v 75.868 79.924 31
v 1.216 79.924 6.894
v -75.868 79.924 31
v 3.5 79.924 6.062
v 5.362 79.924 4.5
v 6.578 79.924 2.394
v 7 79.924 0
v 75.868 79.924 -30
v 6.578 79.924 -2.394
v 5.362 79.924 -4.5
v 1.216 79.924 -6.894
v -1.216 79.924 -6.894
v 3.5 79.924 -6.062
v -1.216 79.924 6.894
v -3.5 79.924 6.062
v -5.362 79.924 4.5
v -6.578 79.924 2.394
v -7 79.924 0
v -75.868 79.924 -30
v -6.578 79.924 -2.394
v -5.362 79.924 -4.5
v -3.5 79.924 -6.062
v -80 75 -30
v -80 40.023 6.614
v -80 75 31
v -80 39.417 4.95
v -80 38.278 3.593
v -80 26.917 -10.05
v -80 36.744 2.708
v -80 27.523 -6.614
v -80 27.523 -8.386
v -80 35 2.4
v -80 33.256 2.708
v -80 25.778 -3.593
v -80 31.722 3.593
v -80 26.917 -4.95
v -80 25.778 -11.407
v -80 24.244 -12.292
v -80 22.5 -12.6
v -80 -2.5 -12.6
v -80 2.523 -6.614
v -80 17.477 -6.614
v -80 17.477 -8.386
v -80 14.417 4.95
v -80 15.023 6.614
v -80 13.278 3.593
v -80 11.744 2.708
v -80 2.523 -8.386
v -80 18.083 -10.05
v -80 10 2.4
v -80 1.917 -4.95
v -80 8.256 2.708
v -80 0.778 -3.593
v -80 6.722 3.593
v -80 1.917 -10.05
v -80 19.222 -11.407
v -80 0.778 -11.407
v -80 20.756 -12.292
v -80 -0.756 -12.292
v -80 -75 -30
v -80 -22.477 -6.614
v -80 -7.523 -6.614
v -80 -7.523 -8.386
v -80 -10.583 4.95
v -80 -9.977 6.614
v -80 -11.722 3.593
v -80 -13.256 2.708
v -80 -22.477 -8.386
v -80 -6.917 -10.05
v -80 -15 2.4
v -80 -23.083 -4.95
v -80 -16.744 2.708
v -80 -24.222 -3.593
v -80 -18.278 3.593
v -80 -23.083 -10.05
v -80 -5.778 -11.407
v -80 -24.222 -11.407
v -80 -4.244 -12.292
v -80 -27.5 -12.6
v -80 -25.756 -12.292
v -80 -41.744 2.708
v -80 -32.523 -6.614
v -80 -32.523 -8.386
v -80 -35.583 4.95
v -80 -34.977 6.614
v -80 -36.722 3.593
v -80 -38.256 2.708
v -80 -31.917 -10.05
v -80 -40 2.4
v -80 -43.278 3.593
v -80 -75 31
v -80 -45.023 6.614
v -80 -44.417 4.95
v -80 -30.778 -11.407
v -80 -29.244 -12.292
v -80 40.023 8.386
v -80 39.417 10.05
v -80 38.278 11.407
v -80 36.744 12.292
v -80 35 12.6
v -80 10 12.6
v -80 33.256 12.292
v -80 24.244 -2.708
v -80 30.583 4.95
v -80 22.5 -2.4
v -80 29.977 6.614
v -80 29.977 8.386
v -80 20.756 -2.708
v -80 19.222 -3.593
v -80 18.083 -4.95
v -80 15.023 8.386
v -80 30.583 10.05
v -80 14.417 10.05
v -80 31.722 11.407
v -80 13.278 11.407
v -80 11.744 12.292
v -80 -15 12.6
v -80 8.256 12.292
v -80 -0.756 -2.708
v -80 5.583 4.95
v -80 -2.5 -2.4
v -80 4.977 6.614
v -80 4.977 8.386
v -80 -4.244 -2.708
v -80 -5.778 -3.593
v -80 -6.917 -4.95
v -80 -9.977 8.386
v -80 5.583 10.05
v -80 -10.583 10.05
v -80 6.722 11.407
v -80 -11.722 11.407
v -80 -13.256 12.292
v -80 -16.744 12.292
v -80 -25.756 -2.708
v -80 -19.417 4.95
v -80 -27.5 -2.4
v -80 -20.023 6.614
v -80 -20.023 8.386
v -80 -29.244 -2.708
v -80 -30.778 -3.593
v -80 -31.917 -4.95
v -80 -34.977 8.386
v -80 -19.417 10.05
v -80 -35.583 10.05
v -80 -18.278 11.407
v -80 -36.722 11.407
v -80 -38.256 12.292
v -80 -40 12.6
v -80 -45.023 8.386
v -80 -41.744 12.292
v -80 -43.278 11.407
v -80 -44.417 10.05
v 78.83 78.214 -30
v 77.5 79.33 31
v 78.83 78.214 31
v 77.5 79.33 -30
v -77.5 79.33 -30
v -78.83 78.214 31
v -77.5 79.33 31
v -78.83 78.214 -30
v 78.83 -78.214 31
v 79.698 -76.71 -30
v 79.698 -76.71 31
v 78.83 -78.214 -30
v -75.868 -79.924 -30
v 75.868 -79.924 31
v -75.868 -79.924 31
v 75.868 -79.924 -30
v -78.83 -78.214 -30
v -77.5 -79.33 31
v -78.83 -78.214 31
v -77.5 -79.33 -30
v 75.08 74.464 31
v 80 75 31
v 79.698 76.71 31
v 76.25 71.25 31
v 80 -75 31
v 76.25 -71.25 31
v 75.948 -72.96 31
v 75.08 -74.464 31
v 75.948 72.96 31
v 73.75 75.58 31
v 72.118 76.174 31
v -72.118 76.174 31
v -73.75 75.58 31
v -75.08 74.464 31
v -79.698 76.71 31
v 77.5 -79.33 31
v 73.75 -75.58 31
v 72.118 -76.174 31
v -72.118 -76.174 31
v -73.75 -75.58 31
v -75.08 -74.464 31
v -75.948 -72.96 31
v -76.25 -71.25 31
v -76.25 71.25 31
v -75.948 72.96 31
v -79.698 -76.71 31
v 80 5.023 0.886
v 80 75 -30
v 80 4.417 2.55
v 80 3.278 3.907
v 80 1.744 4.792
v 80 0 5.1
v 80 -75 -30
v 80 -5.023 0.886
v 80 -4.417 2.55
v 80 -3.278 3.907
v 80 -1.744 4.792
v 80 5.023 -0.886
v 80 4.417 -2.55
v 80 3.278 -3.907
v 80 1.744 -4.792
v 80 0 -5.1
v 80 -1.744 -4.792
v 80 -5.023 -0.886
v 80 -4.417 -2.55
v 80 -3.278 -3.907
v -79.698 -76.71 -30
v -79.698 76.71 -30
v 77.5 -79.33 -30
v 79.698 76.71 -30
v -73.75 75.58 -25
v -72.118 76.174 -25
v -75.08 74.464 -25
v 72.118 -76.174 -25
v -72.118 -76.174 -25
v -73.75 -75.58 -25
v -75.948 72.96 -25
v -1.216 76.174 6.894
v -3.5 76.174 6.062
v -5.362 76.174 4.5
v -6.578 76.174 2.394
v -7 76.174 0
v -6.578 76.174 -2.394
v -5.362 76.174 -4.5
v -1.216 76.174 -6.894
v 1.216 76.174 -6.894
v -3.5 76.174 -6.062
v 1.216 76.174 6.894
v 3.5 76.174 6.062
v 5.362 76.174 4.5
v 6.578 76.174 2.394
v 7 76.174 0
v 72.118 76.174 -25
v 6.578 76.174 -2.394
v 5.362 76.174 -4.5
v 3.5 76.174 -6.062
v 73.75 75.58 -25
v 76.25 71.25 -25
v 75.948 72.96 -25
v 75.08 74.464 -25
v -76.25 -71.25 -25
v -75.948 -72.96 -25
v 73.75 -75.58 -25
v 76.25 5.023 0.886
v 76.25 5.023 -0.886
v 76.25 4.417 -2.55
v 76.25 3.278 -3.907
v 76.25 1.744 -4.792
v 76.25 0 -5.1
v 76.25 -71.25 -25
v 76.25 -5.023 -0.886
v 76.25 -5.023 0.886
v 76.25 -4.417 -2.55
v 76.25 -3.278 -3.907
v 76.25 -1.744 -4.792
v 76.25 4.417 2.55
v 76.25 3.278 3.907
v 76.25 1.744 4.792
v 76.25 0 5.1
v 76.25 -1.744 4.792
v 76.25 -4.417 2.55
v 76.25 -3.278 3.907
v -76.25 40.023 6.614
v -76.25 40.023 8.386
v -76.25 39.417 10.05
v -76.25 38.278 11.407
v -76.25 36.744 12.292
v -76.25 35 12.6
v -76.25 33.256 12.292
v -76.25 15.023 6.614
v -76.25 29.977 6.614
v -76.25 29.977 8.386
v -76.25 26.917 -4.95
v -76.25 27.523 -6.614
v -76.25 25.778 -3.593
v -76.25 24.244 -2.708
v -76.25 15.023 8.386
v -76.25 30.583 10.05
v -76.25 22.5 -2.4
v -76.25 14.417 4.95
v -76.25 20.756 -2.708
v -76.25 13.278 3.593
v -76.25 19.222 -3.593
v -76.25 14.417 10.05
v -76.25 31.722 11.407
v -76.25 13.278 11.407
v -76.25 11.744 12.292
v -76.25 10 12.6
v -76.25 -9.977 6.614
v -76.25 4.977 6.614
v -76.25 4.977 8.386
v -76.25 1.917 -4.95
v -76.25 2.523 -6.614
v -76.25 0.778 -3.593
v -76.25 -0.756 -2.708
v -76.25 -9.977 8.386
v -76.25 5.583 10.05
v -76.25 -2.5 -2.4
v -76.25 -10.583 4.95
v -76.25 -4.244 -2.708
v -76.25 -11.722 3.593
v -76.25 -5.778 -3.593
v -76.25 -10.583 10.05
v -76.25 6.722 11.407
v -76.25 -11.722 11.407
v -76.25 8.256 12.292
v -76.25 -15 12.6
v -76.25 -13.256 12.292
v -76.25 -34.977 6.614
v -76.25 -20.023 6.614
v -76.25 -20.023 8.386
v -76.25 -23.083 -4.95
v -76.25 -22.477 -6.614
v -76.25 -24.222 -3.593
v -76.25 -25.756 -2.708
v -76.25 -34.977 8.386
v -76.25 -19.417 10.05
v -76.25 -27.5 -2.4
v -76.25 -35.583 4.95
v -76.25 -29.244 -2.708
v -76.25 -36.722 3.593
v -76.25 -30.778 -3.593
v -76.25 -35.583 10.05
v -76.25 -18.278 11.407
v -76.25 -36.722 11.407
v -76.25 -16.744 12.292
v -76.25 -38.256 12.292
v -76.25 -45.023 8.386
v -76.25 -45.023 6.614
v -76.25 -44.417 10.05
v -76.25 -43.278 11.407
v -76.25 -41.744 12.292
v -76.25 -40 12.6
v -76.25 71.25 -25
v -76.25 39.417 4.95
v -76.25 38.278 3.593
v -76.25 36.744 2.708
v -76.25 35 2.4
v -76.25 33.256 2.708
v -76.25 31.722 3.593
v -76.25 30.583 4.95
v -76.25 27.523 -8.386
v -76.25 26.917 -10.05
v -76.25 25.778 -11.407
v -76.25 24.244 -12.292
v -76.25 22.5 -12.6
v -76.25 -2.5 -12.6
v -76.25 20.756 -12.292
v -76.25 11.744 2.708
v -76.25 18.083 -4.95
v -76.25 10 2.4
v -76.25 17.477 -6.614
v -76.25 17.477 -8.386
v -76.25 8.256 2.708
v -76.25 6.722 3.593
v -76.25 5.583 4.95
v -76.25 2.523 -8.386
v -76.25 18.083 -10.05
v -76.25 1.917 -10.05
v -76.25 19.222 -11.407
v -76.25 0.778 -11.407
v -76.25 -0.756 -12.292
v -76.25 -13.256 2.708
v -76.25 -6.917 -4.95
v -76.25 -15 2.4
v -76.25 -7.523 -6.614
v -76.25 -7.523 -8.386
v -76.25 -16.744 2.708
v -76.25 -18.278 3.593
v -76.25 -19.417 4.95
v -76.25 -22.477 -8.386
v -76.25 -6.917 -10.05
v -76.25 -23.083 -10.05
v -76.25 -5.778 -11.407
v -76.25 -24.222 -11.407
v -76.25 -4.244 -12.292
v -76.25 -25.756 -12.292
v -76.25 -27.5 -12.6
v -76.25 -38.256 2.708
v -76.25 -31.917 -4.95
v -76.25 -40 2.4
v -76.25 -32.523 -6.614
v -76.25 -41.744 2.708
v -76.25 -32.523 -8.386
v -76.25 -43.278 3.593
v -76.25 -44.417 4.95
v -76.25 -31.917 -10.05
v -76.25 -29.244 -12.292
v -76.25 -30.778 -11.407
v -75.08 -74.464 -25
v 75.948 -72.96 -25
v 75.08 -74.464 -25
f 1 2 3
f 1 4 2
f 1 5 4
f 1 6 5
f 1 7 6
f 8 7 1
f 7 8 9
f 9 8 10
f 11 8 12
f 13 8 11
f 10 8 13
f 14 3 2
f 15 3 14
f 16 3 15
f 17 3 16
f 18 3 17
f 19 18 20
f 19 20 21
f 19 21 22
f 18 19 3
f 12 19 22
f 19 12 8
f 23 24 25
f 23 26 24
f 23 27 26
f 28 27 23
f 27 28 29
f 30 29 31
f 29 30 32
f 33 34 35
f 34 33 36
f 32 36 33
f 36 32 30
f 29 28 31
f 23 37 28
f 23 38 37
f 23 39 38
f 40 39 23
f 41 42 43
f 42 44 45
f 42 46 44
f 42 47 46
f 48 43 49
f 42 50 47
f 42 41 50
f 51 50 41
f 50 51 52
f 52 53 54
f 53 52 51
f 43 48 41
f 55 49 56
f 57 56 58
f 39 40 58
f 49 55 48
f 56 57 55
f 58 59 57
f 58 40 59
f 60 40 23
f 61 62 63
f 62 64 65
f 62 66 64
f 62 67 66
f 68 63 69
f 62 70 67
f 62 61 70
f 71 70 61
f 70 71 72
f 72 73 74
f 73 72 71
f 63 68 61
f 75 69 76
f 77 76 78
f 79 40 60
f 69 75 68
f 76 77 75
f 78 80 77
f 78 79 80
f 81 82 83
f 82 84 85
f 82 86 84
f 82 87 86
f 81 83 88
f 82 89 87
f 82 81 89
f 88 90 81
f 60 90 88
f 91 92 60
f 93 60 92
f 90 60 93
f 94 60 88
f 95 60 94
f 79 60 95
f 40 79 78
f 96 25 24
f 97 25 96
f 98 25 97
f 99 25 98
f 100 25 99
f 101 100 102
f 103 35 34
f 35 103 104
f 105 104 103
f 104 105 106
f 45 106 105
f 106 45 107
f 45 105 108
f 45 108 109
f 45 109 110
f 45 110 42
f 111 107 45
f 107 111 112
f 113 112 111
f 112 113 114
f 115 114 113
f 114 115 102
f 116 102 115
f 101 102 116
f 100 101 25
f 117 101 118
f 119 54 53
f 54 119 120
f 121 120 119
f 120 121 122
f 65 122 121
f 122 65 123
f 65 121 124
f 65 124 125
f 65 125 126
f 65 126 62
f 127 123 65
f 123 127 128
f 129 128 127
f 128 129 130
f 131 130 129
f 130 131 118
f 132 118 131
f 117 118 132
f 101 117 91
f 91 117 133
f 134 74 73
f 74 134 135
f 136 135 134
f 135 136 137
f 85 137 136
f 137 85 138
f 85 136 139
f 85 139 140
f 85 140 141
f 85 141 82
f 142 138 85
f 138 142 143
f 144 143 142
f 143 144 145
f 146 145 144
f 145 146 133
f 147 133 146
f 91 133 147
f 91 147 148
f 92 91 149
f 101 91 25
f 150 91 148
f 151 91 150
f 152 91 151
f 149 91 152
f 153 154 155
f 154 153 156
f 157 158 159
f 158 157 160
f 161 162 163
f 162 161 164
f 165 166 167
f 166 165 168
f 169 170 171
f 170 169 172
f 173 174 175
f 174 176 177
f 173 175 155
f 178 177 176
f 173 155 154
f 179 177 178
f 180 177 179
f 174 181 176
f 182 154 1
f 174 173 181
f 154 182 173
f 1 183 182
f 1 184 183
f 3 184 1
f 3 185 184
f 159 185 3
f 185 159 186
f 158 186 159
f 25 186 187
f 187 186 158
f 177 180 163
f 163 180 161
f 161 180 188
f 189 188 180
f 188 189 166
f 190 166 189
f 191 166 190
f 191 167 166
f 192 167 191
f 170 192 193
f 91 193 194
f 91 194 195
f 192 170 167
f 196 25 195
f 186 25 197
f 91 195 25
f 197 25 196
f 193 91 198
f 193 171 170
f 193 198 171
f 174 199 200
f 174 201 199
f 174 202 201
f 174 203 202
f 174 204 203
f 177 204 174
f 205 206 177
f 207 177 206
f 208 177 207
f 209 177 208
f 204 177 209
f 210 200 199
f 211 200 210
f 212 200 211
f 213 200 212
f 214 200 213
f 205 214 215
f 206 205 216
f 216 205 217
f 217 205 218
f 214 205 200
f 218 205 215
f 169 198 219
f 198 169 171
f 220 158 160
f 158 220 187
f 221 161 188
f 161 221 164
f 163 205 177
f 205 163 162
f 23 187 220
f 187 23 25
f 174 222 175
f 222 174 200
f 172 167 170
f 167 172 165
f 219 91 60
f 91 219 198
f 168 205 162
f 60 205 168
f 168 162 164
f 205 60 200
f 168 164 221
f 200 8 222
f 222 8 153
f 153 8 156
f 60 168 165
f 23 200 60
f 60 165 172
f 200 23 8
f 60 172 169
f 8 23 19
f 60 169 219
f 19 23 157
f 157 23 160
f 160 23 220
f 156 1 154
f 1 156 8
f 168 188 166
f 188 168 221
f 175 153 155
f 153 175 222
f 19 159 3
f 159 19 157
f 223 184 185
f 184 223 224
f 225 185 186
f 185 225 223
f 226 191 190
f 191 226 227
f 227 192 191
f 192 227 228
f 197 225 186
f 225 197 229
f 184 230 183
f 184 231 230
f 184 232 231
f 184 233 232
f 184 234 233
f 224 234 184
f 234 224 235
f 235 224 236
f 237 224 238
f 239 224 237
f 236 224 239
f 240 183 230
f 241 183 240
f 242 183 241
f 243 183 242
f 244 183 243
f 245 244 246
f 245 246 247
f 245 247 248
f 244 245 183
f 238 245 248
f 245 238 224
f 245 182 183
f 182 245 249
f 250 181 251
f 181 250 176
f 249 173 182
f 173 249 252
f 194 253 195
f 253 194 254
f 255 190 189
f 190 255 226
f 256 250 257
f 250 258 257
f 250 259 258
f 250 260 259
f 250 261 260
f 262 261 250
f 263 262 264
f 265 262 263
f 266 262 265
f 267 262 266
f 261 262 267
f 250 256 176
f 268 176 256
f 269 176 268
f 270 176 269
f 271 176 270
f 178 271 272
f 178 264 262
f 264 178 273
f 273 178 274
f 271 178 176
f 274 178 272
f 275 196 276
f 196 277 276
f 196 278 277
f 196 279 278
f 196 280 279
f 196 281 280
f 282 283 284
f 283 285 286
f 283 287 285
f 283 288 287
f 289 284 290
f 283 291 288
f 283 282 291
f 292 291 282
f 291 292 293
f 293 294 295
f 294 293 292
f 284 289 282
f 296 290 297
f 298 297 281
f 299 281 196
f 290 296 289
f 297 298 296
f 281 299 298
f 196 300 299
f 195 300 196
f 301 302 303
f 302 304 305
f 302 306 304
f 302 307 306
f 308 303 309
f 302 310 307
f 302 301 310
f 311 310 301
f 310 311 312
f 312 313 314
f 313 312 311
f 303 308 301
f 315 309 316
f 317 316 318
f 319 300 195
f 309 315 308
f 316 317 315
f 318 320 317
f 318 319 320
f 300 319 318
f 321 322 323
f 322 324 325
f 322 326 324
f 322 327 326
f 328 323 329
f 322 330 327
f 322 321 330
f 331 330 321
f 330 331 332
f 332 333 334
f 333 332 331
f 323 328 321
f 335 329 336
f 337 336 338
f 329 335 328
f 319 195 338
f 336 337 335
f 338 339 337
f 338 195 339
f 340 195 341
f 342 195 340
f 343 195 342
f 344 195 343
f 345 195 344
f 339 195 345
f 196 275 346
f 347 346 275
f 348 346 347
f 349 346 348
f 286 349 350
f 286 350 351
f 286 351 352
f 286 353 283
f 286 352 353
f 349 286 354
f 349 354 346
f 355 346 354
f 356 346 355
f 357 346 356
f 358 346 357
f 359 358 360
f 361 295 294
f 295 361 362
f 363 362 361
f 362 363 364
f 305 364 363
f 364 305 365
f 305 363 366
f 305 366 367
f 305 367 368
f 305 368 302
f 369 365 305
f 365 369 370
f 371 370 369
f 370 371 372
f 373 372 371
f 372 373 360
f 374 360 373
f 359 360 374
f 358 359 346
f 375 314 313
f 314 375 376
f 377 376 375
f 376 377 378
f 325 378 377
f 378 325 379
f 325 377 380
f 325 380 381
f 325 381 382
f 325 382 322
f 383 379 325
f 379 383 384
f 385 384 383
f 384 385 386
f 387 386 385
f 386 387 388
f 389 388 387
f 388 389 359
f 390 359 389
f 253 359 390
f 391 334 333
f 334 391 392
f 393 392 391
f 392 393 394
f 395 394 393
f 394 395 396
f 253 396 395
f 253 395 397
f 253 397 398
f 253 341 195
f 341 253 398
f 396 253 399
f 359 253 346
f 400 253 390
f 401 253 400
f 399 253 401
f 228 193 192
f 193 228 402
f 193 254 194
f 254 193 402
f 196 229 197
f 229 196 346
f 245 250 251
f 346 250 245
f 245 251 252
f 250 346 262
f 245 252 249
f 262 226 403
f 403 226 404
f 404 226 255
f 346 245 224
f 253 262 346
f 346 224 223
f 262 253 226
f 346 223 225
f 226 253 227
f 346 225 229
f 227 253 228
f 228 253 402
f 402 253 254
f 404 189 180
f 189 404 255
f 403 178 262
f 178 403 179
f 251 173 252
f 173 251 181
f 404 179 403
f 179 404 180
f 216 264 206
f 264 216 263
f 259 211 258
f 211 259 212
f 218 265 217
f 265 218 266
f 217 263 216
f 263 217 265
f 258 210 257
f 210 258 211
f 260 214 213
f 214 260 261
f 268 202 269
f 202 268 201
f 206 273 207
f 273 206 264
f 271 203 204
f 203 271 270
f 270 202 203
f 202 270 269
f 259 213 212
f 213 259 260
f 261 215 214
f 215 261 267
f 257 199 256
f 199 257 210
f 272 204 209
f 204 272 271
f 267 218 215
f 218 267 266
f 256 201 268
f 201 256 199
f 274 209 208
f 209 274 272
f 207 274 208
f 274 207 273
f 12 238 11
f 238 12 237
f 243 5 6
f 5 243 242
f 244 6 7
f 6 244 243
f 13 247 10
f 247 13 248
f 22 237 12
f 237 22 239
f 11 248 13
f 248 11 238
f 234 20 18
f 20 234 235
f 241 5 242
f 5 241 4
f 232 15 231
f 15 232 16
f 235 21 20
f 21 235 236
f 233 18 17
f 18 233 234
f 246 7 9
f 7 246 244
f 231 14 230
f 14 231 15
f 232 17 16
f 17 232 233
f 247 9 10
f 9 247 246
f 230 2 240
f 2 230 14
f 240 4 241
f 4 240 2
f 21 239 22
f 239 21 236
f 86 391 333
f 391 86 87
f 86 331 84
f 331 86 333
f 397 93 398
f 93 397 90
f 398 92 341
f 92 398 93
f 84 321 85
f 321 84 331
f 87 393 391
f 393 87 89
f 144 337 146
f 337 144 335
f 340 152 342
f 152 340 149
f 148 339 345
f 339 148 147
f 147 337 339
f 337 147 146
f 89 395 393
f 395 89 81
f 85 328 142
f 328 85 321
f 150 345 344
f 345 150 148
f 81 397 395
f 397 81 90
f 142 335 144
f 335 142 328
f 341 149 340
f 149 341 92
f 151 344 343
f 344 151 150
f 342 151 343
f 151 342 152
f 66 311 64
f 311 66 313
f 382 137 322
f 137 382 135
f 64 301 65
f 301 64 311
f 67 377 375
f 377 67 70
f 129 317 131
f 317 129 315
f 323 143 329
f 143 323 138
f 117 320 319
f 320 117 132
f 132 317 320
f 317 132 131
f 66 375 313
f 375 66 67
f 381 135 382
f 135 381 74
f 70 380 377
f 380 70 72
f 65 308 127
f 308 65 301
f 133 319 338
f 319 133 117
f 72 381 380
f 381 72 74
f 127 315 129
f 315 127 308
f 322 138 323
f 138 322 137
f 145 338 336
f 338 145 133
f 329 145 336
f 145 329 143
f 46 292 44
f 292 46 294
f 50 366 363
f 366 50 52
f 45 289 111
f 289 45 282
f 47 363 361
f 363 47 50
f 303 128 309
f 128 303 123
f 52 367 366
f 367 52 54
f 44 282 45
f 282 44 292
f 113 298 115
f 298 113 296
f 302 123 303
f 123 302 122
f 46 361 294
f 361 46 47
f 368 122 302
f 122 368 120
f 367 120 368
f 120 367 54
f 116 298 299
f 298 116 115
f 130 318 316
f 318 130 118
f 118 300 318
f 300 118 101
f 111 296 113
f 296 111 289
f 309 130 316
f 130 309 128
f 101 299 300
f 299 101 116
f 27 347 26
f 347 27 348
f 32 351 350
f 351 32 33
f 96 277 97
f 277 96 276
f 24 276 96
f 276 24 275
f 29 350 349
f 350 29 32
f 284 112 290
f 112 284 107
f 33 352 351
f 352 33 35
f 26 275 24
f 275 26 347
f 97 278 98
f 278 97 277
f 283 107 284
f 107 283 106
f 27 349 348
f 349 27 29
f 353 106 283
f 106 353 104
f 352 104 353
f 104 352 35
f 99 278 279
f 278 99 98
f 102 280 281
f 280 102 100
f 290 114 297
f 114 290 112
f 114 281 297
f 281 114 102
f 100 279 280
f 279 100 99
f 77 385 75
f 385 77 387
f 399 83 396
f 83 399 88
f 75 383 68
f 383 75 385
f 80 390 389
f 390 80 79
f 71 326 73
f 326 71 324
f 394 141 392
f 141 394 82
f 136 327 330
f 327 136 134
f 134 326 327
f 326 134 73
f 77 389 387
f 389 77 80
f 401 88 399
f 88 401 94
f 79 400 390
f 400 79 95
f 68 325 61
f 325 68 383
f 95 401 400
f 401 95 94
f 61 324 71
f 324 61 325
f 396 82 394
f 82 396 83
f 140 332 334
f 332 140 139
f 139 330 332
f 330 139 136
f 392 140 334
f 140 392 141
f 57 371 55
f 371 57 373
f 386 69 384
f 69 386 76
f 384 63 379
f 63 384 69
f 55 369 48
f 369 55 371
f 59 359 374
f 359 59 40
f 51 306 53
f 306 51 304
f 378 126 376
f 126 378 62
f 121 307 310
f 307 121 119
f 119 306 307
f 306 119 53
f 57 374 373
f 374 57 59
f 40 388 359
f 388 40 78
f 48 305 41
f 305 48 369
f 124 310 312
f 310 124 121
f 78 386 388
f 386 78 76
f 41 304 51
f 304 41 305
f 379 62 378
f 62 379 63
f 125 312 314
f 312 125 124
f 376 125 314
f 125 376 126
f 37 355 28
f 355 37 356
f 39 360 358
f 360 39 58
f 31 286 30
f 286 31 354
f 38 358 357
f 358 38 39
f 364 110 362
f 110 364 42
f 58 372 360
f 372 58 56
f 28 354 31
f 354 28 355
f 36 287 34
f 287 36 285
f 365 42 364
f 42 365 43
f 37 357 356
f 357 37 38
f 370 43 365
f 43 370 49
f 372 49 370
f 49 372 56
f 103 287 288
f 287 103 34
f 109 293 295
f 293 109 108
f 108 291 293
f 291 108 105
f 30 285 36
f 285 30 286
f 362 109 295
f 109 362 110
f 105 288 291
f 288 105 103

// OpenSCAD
$fn=18;

// Messbox
mbL = 150; // Länge
mbB = 150; // Breite 
mbH = 60; // Höhe

// Radien
rm12 = 5.1; // M12
rm16 = 7; // M16

// Ecken
cr0 = 5;

module main()
{
    module box()
    {
        difference()
        {
            minkowski()
            {
                cube([mbL,mbB,mbH], center = true);
                cylinder(r = cr0, h = 1);
            }
            translate([0,0,2.5])
            minkowski()
            {
                cube([mbL-7.5,mbB-7.5,mbH-5], center = true);
                cylinder(r = cr0, h = 1);
            }
        }
    }
    box();
}

//main();

module T1()
{
    difference()
    {
        // Box
        main();
        
        // M16 Ausschnitt
        translate([0, mbB/2+5, 0])rotate([90,0,0])cylinder(r = rm16, h = 10);
        // 8 * M12
        translate([-mbL/2-5,-45,10])rotate([0,90,0])cylinder(r = rm12, h = 10);
        translate([-mbL/2-5,-15,10])rotate([0,90,0])cylinder(r = rm12, h = 10);
        translate([-mbL/2-5,15,10])rotate([0,90,0])cylinder(r = rm12, h = 10);
        translate([-mbL/2-5,45,10])rotate([0,90,0])cylinder(r = rm12, h = 10);
        translate([-mbL/2-5,-45,-10])rotate([0,90,0])cylinder(r = rm12, h = 10);
        translate([-mbL/2-5,-15,-10])rotate([0,90,0])cylinder(r = rm12, h = 10);
        translate([-mbL/2-5,15,-10])rotate([0,90,0])cylinder(r = rm12, h = 10);
        translate([-mbL/2-5,45,-10])rotate([0,90,0])cylinder(r = rm12, h = 10);
    }
}

//T1();

module T2()
{
    difference()
    {
        // Box
        main();
        
        // M16 Ausschnitt
        translate([0, mbB/2+5, 0])rotate([90,0,0])cylinder(r = rm16, h = 10);
        // 8 * M12
        translate([-mbL/2-5,-45,10])rotate([0,90,0])cylinder(r = rm12, h = 10);
        translate([-mbL/2-5,-15,10])rotate([0,90,0])cylinder(r = rm12, h = 10);
        translate([-mbL/2-5,15,10])rotate([0,90,0])cylinder(r = rm12, h = 10);
        translate([-mbL/2-5,45,10])rotate([0,90,0])cylinder(r = rm12, h = 10);
        translate([-mbL/2-5,-45,-10])rotate([0,90,0])cylinder(r = rm12, h = 10);
        translate([-mbL/2-5,-15,-10])rotate([0,90,0])cylinder(r = rm12, h = 10);
        translate([-mbL/2-5,15,-10])rotate([0,90,0])cylinder(r = rm12, h = 10);
        translate([-mbL/2-5,45,-10])rotate([0,90,0])cylinder(r = rm12, h = 10);
    }
}

//T2();

module T3()
{
    difference()
    {
        // Box
        main();
        // M12 Ausschnitt
        translate([mbL/2, 0, 0])rotate([0,90,0])cylinder(r = rm12, h = 10);
        // M16 Ausschnitt
        translate([0, mbB/2+5, 0])rotate([90,0,0])cylinder(r = rm16, h = 10);
        // 7 * M12 Ausschnitt
        // 4 * oben Höhe = 37.5
        translate([-mbL/2-5,-40,7.5])rotate([0,90,0])cylinder(r = rm12, h = 10);
        translate([-mbL/2-5,-15,7.5])rotate([0,90,0])cylinder(r = rm12, h = 10);
        translate([-mbL/2-5,10,7.5])rotate([0,90,0])cylinder(r = rm12, h = 10);
        translate([-mbL/2-5,35,7.5])rotate([0,90,0])cylinder(r = rm12, h = 10);
        // 3 * unten Höhe = 22.5
        translate([-mbL/2-5,-27.5,-7.5])rotate([0,90,0])cylinder(r = rm12, h = 10);
        translate([-mbL/2-5,-2.5,-7.5])rotate([0,90,0])cylinder(r = rm12, h = 10);
        translate([-mbL/2-5,22.5,-7.5])rotate([0,90,0])cylinder(r = rm12, h = 10);
    }
}
T3();
